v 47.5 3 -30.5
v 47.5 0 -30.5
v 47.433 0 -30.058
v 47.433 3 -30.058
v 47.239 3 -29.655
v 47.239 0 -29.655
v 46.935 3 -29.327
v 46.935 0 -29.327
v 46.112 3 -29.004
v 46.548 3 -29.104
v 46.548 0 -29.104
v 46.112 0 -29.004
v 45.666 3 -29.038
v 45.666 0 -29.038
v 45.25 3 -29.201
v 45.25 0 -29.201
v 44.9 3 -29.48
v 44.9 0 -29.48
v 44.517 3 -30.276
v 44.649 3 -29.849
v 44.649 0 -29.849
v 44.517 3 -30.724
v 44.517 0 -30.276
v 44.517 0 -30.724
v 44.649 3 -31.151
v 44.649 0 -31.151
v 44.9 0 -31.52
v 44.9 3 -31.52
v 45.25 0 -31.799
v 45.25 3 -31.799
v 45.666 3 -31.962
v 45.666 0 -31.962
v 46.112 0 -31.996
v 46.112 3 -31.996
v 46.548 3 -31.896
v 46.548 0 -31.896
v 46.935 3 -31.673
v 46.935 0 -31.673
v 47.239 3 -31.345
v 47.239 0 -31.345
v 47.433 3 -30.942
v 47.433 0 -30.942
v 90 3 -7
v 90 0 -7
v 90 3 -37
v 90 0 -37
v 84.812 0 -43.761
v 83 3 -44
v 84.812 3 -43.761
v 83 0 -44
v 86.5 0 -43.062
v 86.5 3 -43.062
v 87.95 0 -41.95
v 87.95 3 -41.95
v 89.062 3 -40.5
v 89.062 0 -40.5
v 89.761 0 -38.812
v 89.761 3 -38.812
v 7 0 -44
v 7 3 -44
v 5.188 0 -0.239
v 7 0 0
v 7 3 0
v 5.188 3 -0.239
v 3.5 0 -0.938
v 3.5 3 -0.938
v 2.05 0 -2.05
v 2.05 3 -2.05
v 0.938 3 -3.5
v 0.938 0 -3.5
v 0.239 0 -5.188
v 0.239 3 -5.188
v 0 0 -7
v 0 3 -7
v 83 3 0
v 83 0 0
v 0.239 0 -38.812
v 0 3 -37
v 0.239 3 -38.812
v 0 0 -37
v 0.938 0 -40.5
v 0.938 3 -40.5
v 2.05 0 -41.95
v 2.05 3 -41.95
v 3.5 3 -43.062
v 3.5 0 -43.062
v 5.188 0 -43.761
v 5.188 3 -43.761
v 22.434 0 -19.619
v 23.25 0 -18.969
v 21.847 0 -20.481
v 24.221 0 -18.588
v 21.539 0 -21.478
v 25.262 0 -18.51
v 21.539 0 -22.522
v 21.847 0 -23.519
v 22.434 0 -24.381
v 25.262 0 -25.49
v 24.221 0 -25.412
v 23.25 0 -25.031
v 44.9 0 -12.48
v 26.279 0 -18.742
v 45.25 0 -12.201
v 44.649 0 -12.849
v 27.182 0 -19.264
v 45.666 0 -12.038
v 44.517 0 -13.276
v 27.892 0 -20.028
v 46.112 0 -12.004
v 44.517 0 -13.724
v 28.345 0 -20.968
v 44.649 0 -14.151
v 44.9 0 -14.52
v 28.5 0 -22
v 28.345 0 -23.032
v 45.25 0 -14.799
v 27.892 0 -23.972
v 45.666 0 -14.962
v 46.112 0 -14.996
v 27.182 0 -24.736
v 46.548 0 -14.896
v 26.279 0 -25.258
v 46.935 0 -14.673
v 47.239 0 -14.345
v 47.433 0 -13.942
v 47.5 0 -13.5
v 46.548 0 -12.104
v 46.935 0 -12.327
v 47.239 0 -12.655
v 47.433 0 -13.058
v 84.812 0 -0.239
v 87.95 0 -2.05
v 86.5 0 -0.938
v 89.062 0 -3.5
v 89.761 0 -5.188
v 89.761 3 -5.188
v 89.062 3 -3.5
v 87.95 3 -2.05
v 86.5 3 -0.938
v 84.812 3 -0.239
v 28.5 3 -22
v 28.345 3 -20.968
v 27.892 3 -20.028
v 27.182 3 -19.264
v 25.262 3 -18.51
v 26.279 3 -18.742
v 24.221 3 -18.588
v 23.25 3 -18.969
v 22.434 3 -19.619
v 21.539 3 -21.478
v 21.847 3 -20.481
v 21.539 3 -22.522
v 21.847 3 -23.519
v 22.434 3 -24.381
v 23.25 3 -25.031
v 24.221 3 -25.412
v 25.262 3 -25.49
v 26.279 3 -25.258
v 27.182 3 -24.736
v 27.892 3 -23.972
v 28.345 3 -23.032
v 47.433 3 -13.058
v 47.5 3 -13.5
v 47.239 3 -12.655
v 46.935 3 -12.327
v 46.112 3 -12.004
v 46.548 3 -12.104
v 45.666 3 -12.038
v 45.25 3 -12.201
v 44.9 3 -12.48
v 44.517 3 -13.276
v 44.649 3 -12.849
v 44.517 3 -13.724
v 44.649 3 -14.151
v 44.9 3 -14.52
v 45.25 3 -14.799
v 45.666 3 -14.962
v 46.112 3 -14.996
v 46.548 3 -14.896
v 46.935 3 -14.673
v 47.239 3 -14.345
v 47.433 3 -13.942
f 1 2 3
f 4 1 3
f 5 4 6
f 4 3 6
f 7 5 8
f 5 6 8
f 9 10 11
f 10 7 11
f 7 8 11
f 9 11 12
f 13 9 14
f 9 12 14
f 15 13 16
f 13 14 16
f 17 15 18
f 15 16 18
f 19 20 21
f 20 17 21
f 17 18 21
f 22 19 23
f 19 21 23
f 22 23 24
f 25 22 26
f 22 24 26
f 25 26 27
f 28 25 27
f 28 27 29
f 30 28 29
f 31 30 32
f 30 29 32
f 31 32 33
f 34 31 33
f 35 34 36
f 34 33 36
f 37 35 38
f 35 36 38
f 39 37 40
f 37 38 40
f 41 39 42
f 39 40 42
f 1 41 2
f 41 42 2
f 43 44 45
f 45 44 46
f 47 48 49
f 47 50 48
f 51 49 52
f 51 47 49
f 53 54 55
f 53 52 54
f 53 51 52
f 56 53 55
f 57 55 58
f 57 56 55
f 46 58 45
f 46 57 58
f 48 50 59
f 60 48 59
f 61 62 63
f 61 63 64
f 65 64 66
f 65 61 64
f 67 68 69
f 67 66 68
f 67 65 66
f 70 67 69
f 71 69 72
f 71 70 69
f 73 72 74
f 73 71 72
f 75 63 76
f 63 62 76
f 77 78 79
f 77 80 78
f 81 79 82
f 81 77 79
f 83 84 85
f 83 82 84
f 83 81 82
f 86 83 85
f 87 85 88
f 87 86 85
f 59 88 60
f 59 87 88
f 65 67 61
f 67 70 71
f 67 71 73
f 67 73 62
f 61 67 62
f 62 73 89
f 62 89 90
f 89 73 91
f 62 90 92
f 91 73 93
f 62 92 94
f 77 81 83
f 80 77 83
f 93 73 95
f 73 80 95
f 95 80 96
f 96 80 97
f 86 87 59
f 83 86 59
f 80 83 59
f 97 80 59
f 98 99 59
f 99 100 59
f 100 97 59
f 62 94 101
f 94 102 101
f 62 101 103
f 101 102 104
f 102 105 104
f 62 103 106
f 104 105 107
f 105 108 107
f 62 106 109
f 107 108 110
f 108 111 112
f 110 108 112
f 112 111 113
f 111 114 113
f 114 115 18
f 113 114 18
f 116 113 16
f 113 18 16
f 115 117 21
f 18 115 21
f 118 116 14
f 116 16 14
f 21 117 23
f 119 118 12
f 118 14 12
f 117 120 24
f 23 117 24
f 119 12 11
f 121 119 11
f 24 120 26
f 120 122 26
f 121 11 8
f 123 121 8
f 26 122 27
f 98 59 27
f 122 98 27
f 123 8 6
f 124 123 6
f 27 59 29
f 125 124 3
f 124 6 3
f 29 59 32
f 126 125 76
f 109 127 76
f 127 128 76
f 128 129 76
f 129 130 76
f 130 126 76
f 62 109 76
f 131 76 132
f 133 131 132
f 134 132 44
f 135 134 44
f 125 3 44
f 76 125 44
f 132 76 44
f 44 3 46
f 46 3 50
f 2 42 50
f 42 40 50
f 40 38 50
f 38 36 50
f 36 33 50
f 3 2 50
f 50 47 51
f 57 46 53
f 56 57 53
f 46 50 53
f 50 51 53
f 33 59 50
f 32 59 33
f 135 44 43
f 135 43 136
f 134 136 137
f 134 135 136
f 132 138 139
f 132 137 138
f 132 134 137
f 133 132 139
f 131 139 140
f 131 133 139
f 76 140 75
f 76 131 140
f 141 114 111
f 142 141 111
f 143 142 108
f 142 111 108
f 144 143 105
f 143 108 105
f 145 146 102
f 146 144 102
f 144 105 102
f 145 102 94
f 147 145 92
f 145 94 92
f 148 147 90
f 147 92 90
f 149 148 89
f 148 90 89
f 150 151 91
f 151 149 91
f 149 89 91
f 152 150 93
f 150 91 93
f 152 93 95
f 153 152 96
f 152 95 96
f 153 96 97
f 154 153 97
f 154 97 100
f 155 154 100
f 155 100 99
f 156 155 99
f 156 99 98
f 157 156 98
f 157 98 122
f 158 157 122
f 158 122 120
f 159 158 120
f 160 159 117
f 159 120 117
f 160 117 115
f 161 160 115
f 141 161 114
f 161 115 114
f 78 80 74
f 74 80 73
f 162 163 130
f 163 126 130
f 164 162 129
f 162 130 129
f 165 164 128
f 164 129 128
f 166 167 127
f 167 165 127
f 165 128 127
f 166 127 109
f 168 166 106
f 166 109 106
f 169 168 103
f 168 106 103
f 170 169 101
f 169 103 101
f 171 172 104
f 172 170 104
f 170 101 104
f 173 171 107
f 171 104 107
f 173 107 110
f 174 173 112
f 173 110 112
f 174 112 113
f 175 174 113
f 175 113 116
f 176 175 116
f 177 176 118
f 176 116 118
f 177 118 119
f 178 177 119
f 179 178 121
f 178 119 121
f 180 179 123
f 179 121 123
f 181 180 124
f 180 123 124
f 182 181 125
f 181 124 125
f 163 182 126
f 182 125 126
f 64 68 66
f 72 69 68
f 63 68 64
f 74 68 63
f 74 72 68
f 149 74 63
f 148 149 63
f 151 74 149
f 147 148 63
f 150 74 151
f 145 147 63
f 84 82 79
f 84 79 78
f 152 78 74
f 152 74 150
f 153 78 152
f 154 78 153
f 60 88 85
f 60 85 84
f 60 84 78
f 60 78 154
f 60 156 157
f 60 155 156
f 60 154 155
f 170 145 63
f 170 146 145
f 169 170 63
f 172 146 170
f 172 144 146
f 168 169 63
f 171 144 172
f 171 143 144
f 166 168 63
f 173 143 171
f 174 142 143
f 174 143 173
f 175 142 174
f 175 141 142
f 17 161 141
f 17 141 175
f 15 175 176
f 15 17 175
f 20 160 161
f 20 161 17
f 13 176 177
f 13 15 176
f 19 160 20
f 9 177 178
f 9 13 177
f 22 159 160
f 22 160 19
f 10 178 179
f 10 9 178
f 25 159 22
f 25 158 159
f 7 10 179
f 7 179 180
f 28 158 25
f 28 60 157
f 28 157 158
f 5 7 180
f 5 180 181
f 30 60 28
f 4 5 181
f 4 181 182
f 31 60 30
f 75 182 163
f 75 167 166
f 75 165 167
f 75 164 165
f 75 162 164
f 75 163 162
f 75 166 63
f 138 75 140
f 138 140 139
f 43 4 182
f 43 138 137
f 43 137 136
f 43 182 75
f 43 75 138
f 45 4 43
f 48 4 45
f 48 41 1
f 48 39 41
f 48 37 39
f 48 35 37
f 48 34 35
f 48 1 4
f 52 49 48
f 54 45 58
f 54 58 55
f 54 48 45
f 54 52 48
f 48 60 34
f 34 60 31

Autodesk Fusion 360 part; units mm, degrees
sketch "Sketch1" plane through (0, 0, 0) normal (0, 1, 0) x (1, 0, 0)
  line L0 (7, 0) -> (83, 0)
  line L1 (90, 7) -> (90, 37)
  line L2 (83, 44) -> (7, 44)
  line L3 (0, 37) -> (0, 7)
  line L4 (0, 22) -> (90, 22) construction
  circle A0 centre (25, 22) radius 3.5
  circle A1 centre (25, 22) radius 32.5 construction
  arc A2 (7, 44) -> (0, 37) centre (7, 37) ccw
  arc A3 (90, 37) -> (83, 44) centre (83, 37) ccw
  arc A4 (0, 7) -> (7, 0) centre (7, 7) ccw
  arc A5 (83, 0) -> (90, 7) centre (83, 7) ccw
  line L5 (46, 63.3038) -> (46, -13) construction
  circle A6 centre (46, 30.5) radius 1.5
  circle A7 centre (46, 13.5) radius 1.5
  point P0 (90, 0)
  point P1 (0, 44)
  dimension "szerokosc" = 90
  dimension "wysokosc" = 44
  dimension "d_osi" = 7
  dimension "d4" = 25
  dimension "d_kola" = 65
  dimension "d6" = 7
  dimension "d7" = 7
  dimension "d8" = 7
  dimension "d9" = 7
  dimension "d10" = 3
  dimension "d11" = 3
  dimension "miedzy_otworami" = 17
  dimension "d13" = 8.5
  dimension "d14" = 21
extrude "Extrude1" add sketch "Sketch1" along normal blind 3
sketch "Sketch2" plane through (0, 3, 0) normal (0, 1, 0) x (-1, 0, 0)
  circle A0 centre (-25, -22) radius 3.5
  circle A1 centre (-46, -30.5) radius 1.5
  circle A2 centre (-46, -13.5) radius 1.5
  arc A3 (-83, 0) -> (-90, -7) centre (-83, -7) ccw
  line L0 (-90, -7) -> (-90, -37)
  arc A4 (-90, -37) -> (-83, -44) centre (-83, -37) ccw
  line L1 (-83, -44) -> (-7, -44)
  arc A5 (-7, -44) -> (0, -37) centre (-7, -37) ccw
  line L2 (0, -37) -> (0, -7)
  arc A6 (0, -7) -> (-7, 0) centre (-7, -7) ccw
  line L3 (-7, 0) -> (-83, 0)
equation "wysokosc = szerokosc / 3 + 2 * d_osi"
equation "d6 = d_osi"
equation "d7 = d_osi"
equation "d8 = d_osi"
equation "d9 = d_osi"
equation "miedzy_otworami = 20 mm - 3 mm"
equation "d13 = miedzy_otworami / 2"
